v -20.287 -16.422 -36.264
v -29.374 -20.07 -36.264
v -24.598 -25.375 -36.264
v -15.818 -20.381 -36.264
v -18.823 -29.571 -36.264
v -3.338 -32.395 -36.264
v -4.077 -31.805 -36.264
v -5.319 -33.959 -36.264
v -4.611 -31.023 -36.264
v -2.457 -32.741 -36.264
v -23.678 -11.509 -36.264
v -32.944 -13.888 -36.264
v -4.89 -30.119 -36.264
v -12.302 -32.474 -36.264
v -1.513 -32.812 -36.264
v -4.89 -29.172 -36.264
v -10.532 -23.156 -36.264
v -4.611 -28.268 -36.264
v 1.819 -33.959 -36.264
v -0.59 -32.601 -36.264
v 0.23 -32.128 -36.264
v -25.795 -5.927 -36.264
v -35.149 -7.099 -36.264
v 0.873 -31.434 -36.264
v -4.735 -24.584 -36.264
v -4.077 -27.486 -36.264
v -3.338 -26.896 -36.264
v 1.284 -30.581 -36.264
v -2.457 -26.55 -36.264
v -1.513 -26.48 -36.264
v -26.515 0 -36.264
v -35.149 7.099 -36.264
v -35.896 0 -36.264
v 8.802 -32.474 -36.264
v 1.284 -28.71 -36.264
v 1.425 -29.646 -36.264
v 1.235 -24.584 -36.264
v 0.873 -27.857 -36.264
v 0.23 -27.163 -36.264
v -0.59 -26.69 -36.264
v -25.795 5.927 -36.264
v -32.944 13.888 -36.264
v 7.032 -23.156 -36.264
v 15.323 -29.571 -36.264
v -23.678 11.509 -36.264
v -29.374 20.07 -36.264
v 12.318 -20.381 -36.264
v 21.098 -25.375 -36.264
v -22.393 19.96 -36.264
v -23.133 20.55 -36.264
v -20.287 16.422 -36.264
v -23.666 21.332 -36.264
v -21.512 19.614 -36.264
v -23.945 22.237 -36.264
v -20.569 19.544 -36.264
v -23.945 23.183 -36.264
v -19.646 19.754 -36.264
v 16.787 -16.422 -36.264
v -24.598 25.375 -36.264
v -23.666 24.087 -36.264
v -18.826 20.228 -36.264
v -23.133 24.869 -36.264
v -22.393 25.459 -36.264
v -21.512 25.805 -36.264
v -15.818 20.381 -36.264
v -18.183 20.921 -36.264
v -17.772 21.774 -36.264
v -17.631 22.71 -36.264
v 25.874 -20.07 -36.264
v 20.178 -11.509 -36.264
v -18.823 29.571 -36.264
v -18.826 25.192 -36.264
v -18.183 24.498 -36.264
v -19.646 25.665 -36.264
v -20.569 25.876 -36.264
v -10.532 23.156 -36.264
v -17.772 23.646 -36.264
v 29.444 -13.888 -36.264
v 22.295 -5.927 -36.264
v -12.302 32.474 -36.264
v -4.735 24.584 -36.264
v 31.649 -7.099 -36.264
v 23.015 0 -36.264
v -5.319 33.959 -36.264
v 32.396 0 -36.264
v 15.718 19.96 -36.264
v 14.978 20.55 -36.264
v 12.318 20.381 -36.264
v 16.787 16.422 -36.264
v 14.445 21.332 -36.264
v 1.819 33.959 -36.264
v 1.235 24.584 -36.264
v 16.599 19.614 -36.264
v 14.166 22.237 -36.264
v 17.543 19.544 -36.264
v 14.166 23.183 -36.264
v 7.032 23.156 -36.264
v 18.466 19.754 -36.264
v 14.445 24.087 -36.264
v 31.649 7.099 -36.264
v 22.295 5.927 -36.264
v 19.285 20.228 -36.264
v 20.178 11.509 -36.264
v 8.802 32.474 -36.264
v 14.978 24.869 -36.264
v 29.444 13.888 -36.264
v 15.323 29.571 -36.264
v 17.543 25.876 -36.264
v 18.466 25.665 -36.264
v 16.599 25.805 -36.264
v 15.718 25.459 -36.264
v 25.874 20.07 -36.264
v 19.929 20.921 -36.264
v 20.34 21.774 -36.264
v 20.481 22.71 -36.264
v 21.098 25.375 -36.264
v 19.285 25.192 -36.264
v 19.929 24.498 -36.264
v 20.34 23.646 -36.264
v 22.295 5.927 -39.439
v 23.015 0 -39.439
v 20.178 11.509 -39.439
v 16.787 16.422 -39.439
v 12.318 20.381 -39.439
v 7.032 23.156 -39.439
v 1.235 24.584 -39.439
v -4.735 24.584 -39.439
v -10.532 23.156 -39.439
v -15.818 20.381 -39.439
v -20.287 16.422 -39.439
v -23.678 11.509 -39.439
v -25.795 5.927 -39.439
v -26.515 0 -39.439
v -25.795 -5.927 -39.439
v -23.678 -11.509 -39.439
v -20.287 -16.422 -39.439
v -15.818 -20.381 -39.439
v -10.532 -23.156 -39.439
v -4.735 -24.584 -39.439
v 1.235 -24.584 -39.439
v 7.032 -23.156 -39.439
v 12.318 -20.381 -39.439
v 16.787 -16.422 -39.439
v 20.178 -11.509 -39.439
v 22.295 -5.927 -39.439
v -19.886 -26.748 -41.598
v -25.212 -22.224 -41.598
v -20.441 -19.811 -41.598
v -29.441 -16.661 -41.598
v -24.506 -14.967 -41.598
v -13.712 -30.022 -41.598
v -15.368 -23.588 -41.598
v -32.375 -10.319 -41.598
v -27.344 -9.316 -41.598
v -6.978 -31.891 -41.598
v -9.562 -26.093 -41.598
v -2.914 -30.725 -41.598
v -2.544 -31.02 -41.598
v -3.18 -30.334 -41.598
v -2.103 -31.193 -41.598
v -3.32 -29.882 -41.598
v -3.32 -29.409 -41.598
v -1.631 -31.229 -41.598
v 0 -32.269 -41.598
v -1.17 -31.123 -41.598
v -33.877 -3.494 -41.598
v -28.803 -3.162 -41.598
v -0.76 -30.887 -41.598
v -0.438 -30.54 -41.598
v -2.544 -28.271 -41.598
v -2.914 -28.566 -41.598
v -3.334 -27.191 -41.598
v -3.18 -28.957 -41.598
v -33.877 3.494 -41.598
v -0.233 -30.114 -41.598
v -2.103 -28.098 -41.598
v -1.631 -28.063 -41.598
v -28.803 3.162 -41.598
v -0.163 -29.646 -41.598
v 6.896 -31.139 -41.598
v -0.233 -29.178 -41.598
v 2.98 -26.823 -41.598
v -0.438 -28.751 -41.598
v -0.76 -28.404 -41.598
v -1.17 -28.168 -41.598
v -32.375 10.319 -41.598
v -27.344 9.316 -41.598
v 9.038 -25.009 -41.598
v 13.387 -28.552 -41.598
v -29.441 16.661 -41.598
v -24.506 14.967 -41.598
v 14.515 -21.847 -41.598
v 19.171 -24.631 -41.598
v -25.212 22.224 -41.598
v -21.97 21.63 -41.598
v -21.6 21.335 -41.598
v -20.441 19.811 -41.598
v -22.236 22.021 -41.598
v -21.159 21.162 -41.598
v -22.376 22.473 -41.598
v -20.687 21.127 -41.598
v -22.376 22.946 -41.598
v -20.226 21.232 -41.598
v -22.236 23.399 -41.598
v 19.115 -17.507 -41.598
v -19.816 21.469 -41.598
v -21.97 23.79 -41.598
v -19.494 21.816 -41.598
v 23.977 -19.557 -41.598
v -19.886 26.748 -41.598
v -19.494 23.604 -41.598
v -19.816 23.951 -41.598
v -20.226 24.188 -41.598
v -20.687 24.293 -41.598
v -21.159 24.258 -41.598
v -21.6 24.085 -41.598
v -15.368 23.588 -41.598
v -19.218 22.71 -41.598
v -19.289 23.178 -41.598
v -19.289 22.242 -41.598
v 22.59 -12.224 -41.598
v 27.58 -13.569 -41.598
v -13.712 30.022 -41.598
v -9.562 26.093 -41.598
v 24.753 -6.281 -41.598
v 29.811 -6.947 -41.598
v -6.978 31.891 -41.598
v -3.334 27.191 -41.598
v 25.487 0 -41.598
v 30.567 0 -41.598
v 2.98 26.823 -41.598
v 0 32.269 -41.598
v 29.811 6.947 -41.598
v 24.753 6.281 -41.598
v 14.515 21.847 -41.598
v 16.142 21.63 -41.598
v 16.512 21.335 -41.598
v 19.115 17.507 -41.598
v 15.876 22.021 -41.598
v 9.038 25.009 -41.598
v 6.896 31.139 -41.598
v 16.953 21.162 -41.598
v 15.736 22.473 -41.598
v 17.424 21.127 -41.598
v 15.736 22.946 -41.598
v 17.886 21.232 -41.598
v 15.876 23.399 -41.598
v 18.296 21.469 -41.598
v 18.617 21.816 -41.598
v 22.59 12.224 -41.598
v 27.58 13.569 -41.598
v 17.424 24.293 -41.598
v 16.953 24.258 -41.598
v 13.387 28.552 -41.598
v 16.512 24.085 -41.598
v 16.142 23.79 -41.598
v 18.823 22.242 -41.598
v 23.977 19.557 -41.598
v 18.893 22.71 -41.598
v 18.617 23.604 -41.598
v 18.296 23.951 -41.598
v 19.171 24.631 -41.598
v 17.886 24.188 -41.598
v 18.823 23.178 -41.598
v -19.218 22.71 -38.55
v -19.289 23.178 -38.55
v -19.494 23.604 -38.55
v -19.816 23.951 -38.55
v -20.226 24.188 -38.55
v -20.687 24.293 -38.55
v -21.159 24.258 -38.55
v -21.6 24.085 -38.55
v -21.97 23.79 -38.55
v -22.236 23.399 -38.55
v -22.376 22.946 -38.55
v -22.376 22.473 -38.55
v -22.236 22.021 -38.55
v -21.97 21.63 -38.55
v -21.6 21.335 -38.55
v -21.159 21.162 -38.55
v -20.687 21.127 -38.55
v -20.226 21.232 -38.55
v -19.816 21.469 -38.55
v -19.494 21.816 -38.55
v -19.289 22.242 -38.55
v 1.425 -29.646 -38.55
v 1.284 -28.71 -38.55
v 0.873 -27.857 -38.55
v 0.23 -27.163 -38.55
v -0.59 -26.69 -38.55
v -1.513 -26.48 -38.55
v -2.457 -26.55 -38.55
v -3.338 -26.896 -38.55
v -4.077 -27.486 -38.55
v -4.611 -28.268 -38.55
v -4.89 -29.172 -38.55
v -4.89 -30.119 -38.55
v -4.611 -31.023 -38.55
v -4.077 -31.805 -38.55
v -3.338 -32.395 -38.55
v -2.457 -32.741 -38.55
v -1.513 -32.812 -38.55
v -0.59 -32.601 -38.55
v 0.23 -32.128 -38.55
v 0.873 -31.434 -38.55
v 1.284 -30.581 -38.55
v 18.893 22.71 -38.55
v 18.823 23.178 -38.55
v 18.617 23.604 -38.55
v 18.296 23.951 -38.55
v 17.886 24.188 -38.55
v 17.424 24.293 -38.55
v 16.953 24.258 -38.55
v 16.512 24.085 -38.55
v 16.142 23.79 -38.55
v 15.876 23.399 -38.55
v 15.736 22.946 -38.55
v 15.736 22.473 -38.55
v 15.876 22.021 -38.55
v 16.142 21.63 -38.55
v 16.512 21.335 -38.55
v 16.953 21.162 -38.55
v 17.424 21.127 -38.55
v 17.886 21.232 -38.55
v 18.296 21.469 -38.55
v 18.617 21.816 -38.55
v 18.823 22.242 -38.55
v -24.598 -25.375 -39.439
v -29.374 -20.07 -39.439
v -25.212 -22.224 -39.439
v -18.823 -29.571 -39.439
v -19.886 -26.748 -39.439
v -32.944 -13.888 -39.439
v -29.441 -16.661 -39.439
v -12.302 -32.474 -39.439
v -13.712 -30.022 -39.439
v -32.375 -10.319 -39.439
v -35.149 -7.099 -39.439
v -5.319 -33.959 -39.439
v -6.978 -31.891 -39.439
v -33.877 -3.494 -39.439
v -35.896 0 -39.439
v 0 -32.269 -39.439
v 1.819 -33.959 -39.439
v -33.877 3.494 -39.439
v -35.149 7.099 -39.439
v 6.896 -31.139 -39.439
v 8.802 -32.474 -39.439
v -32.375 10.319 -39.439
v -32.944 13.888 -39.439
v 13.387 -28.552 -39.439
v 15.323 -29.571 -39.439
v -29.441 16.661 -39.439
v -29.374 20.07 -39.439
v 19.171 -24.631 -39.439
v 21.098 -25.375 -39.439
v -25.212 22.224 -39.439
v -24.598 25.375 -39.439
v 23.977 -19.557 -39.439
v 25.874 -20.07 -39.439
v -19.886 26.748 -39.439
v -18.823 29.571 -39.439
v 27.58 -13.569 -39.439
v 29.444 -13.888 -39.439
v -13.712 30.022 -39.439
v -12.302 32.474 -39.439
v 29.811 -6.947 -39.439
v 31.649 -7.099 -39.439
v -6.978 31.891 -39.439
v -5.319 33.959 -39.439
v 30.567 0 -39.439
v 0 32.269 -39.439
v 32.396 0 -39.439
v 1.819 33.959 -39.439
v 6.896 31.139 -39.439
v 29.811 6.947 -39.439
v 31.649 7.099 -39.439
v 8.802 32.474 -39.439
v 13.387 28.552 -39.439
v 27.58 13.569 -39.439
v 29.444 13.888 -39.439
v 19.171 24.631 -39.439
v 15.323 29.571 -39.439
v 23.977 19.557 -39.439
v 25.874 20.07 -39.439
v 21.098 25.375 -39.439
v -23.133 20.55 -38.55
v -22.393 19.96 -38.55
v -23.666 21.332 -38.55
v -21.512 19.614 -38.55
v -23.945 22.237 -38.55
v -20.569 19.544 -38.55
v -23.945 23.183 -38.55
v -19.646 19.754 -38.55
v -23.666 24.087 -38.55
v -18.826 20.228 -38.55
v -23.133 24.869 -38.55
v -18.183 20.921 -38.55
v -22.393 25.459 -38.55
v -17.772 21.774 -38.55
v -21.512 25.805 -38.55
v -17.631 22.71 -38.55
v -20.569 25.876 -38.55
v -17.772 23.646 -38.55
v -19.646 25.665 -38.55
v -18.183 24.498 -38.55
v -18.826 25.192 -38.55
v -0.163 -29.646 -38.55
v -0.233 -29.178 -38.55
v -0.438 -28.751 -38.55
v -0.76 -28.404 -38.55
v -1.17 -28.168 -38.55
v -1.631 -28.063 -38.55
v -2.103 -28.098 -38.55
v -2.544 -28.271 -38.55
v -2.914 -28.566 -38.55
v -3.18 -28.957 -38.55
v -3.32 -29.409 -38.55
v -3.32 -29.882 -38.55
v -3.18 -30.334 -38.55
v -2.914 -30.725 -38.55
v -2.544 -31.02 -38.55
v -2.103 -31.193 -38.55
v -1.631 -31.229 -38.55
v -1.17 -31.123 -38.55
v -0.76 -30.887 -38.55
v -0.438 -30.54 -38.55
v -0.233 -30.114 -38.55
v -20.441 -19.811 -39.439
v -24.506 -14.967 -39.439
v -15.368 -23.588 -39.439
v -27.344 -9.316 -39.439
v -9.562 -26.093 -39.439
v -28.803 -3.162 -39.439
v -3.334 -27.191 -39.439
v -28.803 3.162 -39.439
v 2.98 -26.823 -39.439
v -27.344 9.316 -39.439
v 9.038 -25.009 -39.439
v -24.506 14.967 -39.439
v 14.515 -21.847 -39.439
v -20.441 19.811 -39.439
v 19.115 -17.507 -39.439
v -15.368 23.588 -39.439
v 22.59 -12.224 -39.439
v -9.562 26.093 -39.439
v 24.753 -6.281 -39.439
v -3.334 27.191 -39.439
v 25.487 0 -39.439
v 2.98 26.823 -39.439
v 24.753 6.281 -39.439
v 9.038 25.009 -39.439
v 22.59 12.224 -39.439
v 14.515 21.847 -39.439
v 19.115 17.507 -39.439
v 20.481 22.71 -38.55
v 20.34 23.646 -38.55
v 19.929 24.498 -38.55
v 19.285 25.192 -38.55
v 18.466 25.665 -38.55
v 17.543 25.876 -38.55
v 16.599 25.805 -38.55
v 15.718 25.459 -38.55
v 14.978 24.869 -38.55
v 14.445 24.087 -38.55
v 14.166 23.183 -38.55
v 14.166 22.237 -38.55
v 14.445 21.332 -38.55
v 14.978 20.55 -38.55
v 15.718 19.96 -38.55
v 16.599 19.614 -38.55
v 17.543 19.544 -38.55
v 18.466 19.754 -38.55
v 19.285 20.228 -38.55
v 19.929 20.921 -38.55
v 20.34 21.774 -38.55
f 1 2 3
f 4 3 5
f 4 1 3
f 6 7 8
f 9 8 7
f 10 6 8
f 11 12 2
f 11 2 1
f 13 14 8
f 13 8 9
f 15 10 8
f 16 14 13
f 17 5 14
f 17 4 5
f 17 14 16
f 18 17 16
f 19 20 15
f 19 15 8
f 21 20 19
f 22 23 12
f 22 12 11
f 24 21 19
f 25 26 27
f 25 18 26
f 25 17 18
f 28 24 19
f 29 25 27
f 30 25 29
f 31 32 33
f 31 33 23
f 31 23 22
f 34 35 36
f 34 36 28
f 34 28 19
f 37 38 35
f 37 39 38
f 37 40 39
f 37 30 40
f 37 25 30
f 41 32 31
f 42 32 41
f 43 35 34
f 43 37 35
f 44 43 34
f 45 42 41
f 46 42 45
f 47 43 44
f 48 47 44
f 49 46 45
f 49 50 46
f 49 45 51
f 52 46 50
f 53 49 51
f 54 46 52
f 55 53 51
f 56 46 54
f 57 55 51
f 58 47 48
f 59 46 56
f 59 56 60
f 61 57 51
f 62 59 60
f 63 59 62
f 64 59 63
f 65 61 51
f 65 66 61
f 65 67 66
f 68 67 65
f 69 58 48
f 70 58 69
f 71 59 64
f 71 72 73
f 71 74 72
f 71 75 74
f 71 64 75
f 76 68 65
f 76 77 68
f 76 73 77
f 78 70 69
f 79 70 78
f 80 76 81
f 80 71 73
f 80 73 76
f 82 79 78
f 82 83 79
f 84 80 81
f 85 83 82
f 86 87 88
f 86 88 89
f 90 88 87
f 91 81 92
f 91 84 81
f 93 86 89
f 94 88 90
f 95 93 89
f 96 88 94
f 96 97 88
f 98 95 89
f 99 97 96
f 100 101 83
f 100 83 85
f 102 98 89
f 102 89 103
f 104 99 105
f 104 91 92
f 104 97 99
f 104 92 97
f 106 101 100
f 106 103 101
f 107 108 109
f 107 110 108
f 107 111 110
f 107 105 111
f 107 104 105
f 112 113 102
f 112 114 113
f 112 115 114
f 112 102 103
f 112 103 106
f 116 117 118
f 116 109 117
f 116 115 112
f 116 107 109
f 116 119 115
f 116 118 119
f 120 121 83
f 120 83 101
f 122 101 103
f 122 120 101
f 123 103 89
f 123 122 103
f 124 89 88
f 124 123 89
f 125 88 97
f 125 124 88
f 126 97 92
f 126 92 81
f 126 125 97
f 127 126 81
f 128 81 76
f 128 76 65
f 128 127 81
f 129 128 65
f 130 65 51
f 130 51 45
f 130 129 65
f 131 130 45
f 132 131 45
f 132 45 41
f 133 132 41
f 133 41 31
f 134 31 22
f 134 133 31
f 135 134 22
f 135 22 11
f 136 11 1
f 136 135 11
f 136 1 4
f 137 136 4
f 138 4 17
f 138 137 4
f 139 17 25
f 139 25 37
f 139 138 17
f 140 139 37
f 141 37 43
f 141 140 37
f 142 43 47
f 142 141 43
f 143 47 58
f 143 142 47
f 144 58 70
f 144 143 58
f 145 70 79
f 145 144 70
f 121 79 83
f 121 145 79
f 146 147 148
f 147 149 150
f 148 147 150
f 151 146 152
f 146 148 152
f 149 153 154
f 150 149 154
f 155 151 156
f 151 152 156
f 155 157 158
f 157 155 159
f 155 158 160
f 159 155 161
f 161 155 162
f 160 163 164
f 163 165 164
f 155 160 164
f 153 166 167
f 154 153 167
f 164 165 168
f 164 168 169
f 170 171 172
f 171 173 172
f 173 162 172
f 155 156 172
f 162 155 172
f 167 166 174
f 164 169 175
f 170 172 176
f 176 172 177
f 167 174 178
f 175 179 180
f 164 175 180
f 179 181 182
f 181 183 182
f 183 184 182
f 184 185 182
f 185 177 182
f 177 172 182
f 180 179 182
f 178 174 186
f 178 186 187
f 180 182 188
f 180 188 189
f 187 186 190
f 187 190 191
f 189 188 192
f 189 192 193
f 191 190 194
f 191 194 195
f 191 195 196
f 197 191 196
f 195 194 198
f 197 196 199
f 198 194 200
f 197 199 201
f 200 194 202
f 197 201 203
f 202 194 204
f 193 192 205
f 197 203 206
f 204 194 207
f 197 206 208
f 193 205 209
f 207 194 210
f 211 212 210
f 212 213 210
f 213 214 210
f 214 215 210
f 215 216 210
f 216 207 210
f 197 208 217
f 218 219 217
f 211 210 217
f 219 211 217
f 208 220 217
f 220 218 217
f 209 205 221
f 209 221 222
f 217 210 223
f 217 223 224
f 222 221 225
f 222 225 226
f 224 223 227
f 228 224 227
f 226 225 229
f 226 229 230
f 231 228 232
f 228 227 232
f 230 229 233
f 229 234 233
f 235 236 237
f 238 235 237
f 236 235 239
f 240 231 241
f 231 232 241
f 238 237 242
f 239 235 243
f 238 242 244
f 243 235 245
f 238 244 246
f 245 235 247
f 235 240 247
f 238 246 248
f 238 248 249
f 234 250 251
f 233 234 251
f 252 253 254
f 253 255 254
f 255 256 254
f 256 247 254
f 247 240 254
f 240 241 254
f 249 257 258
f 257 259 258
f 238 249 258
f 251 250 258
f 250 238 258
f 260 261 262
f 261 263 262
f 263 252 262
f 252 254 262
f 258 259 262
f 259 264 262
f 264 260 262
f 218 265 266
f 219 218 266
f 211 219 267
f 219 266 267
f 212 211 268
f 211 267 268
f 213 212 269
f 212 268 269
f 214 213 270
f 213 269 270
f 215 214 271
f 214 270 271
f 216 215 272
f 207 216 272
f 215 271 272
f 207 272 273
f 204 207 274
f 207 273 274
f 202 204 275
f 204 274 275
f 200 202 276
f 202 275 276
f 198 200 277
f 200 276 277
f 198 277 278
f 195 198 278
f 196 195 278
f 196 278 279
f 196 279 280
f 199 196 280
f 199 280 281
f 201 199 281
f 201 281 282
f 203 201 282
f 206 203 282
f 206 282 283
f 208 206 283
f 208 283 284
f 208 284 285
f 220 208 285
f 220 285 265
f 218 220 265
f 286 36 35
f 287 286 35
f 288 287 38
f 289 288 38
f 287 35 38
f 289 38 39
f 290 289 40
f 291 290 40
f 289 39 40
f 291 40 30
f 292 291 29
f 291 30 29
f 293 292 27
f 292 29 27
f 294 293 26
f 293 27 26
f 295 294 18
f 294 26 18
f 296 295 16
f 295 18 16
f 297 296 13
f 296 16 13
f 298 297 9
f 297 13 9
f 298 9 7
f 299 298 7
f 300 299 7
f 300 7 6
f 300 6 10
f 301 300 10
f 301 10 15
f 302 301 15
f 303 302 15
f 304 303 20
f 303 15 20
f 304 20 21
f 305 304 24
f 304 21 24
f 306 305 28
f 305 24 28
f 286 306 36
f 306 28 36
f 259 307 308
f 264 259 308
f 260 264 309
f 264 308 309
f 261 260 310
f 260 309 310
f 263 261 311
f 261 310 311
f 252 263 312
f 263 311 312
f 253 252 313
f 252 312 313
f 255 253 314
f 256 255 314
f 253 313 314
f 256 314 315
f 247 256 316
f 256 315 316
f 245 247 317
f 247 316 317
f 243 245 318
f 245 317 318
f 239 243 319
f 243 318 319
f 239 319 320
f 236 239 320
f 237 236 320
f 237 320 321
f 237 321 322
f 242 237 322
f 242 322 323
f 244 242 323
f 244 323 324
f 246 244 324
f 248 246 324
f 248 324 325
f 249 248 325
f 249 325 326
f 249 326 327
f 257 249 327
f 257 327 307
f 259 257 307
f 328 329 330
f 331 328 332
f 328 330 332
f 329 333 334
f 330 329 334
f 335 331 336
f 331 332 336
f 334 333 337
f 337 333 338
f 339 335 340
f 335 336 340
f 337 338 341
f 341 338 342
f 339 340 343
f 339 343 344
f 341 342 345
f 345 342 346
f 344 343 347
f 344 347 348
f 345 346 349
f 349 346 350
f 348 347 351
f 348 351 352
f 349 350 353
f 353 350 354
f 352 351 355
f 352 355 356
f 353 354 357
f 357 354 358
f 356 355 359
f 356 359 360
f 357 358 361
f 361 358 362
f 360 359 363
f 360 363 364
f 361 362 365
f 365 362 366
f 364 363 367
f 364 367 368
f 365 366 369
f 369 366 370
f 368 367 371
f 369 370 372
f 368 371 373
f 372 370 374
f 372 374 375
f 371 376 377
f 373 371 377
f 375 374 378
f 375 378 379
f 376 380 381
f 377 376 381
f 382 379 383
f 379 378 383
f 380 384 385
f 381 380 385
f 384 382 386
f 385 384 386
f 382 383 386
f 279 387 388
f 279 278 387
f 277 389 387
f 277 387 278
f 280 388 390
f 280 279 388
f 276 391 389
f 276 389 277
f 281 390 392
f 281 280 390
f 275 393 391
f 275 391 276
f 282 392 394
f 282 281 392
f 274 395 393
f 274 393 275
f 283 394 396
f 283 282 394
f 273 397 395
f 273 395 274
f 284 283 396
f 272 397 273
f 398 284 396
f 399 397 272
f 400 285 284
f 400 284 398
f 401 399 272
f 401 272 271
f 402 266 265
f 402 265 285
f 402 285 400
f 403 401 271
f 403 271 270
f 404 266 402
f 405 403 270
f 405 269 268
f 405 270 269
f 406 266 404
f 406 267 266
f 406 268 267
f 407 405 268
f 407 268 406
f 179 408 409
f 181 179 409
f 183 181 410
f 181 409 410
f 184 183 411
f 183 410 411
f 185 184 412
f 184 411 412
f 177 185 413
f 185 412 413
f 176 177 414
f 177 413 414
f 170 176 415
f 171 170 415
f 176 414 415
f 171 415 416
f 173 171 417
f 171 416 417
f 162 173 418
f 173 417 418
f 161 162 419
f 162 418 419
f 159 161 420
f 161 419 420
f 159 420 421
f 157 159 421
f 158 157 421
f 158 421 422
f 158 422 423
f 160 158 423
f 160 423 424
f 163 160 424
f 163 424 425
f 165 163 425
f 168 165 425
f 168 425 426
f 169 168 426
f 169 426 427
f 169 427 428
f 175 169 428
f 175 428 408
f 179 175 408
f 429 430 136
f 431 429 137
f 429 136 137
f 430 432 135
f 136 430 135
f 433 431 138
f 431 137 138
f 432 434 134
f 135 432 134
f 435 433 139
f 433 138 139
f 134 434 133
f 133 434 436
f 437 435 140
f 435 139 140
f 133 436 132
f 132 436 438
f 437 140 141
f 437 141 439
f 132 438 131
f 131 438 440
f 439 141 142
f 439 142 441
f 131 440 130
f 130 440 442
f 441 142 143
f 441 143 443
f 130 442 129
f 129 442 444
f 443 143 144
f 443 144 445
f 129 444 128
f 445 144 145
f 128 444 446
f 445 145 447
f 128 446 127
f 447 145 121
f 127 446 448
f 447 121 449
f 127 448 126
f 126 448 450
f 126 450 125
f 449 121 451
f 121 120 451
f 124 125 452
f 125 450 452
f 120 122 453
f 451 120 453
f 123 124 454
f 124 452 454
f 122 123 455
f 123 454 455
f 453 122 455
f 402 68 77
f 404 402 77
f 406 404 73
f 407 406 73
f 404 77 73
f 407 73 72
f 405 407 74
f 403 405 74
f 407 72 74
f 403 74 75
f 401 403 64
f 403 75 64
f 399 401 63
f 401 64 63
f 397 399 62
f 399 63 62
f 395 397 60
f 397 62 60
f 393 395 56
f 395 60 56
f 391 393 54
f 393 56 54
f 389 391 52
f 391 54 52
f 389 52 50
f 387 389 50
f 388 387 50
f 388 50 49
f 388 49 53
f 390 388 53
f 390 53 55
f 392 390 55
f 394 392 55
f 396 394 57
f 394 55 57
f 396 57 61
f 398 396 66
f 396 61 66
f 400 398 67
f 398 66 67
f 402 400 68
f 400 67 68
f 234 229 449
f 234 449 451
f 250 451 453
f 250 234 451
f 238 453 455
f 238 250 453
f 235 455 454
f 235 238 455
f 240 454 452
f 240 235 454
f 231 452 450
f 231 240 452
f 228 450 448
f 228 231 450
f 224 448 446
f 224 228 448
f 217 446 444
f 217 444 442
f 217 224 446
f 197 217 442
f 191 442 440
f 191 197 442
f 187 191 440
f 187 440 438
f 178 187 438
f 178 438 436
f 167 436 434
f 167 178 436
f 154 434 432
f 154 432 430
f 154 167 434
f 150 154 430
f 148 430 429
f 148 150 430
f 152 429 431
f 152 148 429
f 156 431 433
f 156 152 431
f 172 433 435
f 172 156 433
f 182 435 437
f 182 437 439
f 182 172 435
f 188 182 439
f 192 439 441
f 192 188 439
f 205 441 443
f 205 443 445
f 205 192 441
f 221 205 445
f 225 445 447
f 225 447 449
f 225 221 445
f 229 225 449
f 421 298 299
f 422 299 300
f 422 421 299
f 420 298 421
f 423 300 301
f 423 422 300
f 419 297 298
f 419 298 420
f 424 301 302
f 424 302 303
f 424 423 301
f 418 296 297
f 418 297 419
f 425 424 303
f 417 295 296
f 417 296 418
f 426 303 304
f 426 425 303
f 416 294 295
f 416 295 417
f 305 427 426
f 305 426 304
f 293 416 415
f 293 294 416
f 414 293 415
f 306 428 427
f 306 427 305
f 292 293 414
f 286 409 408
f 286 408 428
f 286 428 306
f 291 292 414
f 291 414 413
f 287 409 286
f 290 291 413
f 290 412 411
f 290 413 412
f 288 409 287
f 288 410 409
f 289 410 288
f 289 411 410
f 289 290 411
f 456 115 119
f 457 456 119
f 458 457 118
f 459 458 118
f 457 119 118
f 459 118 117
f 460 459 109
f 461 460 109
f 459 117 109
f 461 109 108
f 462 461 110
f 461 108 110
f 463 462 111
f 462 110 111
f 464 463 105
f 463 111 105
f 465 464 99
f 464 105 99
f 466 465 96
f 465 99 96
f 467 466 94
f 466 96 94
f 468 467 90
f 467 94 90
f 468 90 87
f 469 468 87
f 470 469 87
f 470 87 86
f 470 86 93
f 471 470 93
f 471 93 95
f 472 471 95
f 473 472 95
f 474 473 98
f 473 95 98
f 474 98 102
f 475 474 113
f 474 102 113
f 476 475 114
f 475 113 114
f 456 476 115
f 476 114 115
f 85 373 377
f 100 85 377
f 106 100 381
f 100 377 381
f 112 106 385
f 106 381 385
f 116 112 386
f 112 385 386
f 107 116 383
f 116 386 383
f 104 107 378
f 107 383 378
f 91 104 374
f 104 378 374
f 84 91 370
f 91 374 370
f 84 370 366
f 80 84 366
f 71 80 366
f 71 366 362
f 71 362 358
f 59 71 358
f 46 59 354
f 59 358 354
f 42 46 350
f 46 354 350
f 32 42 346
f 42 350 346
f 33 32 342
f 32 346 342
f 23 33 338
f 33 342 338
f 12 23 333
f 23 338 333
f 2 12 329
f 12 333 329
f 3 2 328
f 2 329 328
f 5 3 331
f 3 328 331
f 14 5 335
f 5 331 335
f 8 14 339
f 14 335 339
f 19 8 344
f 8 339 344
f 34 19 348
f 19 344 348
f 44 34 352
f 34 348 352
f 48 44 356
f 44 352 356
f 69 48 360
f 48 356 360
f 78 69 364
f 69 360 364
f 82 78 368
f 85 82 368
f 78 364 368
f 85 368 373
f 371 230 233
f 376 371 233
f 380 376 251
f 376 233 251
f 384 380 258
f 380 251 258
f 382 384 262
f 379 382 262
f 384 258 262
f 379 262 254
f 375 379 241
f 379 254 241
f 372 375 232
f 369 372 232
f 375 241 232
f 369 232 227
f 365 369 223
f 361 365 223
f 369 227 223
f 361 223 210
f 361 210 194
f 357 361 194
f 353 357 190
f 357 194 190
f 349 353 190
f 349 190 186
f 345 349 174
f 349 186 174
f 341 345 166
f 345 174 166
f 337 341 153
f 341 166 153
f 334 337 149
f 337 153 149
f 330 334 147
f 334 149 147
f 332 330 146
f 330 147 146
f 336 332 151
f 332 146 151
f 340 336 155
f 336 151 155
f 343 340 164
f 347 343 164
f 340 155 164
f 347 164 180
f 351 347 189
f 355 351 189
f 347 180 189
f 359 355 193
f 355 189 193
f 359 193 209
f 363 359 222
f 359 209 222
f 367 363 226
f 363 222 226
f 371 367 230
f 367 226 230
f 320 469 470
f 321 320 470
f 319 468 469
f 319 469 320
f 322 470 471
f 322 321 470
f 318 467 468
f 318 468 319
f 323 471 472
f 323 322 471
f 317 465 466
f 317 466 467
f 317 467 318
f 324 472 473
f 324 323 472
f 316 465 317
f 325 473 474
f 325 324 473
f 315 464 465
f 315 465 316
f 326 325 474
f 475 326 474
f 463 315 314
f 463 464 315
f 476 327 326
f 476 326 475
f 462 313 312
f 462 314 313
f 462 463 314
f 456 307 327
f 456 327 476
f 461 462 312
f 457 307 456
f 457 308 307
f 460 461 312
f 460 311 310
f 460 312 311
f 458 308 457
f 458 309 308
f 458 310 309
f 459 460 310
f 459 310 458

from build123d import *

# Parameters (mm, degrees)
SKETCH018_R     = 32.316823
SKETCH018_R_2   = 27.236823
PAD008_DEPTH    = 2.159
SKETCH019_R     = 34.145623
SKETCH019_R_2   = 24.765
PAD009_DEPTH    = 3.175
SKETCH020_R     = 1.5875
POCKET006_DEPTH = 5.335
SKETCH021_R     = 3.175
POCKET007_DEPTH = 2.286


with BuildPart() as part:
    # Sketch018 (on Face1 of Binder011) → Pad008 (new body)
    with BuildSketch(Plane.XY.offset(-41.598449)):
        with Locations((-1.75, 0)):
            Circle(SKETCH018_R)
        with Locations((-1.75, 0)):
            Circle(SKETCH018_R_2, mode=Mode.SUBTRACT)
    extrude(amount=PAD008_DEPTH)

    # Sketch019 (on Face3 of Pad008) → Pad009 (join)
    with BuildSketch(Plane.XY.offset(-39.439449)):
        with Locations((-1.75, 0)):
            Circle(SKETCH019_R)
        with Locations((-1.75, 0)):
            Circle(SKETCH019_R_2, mode=Mode.SUBTRACT)
    extrude(amount=PAD009_DEPTH)

    # Sketch020 (on Face6 of Pad009) → Pocket006 (cut, through all)
    with BuildSketch(Plane.XY.offset(-36.264449)):
        with Locations((-1.75, -29.645623)):
            Circle(SKETCH020_R)
        with Locations((17.305839, 22.709864)):
            Circle(SKETCH020_R)
        with Locations((-20.805839, 22.709864)):
            Circle(SKETCH020_R)
    extrude(amount=-POCKET006_DEPTH, mode=Mode.SUBTRACT)

    # Sketch021 (on Face9 of Pocket006) → Pocket007 (cut)
    with BuildSketch(Plane.XY.offset(-36.264449)):
        with Locations((-20.805839, 22.709864)):
            Circle(SKETCH021_R)
        with Locations((17.305839, 22.709864)):
            Circle(SKETCH021_R)
        with Locations((-1.75, -29.645623)):
            Circle(SKETCH021_R)
    extrude(amount=-POCKET007_DEPTH, mode=Mode.SUBTRACT)


solid = part.part
